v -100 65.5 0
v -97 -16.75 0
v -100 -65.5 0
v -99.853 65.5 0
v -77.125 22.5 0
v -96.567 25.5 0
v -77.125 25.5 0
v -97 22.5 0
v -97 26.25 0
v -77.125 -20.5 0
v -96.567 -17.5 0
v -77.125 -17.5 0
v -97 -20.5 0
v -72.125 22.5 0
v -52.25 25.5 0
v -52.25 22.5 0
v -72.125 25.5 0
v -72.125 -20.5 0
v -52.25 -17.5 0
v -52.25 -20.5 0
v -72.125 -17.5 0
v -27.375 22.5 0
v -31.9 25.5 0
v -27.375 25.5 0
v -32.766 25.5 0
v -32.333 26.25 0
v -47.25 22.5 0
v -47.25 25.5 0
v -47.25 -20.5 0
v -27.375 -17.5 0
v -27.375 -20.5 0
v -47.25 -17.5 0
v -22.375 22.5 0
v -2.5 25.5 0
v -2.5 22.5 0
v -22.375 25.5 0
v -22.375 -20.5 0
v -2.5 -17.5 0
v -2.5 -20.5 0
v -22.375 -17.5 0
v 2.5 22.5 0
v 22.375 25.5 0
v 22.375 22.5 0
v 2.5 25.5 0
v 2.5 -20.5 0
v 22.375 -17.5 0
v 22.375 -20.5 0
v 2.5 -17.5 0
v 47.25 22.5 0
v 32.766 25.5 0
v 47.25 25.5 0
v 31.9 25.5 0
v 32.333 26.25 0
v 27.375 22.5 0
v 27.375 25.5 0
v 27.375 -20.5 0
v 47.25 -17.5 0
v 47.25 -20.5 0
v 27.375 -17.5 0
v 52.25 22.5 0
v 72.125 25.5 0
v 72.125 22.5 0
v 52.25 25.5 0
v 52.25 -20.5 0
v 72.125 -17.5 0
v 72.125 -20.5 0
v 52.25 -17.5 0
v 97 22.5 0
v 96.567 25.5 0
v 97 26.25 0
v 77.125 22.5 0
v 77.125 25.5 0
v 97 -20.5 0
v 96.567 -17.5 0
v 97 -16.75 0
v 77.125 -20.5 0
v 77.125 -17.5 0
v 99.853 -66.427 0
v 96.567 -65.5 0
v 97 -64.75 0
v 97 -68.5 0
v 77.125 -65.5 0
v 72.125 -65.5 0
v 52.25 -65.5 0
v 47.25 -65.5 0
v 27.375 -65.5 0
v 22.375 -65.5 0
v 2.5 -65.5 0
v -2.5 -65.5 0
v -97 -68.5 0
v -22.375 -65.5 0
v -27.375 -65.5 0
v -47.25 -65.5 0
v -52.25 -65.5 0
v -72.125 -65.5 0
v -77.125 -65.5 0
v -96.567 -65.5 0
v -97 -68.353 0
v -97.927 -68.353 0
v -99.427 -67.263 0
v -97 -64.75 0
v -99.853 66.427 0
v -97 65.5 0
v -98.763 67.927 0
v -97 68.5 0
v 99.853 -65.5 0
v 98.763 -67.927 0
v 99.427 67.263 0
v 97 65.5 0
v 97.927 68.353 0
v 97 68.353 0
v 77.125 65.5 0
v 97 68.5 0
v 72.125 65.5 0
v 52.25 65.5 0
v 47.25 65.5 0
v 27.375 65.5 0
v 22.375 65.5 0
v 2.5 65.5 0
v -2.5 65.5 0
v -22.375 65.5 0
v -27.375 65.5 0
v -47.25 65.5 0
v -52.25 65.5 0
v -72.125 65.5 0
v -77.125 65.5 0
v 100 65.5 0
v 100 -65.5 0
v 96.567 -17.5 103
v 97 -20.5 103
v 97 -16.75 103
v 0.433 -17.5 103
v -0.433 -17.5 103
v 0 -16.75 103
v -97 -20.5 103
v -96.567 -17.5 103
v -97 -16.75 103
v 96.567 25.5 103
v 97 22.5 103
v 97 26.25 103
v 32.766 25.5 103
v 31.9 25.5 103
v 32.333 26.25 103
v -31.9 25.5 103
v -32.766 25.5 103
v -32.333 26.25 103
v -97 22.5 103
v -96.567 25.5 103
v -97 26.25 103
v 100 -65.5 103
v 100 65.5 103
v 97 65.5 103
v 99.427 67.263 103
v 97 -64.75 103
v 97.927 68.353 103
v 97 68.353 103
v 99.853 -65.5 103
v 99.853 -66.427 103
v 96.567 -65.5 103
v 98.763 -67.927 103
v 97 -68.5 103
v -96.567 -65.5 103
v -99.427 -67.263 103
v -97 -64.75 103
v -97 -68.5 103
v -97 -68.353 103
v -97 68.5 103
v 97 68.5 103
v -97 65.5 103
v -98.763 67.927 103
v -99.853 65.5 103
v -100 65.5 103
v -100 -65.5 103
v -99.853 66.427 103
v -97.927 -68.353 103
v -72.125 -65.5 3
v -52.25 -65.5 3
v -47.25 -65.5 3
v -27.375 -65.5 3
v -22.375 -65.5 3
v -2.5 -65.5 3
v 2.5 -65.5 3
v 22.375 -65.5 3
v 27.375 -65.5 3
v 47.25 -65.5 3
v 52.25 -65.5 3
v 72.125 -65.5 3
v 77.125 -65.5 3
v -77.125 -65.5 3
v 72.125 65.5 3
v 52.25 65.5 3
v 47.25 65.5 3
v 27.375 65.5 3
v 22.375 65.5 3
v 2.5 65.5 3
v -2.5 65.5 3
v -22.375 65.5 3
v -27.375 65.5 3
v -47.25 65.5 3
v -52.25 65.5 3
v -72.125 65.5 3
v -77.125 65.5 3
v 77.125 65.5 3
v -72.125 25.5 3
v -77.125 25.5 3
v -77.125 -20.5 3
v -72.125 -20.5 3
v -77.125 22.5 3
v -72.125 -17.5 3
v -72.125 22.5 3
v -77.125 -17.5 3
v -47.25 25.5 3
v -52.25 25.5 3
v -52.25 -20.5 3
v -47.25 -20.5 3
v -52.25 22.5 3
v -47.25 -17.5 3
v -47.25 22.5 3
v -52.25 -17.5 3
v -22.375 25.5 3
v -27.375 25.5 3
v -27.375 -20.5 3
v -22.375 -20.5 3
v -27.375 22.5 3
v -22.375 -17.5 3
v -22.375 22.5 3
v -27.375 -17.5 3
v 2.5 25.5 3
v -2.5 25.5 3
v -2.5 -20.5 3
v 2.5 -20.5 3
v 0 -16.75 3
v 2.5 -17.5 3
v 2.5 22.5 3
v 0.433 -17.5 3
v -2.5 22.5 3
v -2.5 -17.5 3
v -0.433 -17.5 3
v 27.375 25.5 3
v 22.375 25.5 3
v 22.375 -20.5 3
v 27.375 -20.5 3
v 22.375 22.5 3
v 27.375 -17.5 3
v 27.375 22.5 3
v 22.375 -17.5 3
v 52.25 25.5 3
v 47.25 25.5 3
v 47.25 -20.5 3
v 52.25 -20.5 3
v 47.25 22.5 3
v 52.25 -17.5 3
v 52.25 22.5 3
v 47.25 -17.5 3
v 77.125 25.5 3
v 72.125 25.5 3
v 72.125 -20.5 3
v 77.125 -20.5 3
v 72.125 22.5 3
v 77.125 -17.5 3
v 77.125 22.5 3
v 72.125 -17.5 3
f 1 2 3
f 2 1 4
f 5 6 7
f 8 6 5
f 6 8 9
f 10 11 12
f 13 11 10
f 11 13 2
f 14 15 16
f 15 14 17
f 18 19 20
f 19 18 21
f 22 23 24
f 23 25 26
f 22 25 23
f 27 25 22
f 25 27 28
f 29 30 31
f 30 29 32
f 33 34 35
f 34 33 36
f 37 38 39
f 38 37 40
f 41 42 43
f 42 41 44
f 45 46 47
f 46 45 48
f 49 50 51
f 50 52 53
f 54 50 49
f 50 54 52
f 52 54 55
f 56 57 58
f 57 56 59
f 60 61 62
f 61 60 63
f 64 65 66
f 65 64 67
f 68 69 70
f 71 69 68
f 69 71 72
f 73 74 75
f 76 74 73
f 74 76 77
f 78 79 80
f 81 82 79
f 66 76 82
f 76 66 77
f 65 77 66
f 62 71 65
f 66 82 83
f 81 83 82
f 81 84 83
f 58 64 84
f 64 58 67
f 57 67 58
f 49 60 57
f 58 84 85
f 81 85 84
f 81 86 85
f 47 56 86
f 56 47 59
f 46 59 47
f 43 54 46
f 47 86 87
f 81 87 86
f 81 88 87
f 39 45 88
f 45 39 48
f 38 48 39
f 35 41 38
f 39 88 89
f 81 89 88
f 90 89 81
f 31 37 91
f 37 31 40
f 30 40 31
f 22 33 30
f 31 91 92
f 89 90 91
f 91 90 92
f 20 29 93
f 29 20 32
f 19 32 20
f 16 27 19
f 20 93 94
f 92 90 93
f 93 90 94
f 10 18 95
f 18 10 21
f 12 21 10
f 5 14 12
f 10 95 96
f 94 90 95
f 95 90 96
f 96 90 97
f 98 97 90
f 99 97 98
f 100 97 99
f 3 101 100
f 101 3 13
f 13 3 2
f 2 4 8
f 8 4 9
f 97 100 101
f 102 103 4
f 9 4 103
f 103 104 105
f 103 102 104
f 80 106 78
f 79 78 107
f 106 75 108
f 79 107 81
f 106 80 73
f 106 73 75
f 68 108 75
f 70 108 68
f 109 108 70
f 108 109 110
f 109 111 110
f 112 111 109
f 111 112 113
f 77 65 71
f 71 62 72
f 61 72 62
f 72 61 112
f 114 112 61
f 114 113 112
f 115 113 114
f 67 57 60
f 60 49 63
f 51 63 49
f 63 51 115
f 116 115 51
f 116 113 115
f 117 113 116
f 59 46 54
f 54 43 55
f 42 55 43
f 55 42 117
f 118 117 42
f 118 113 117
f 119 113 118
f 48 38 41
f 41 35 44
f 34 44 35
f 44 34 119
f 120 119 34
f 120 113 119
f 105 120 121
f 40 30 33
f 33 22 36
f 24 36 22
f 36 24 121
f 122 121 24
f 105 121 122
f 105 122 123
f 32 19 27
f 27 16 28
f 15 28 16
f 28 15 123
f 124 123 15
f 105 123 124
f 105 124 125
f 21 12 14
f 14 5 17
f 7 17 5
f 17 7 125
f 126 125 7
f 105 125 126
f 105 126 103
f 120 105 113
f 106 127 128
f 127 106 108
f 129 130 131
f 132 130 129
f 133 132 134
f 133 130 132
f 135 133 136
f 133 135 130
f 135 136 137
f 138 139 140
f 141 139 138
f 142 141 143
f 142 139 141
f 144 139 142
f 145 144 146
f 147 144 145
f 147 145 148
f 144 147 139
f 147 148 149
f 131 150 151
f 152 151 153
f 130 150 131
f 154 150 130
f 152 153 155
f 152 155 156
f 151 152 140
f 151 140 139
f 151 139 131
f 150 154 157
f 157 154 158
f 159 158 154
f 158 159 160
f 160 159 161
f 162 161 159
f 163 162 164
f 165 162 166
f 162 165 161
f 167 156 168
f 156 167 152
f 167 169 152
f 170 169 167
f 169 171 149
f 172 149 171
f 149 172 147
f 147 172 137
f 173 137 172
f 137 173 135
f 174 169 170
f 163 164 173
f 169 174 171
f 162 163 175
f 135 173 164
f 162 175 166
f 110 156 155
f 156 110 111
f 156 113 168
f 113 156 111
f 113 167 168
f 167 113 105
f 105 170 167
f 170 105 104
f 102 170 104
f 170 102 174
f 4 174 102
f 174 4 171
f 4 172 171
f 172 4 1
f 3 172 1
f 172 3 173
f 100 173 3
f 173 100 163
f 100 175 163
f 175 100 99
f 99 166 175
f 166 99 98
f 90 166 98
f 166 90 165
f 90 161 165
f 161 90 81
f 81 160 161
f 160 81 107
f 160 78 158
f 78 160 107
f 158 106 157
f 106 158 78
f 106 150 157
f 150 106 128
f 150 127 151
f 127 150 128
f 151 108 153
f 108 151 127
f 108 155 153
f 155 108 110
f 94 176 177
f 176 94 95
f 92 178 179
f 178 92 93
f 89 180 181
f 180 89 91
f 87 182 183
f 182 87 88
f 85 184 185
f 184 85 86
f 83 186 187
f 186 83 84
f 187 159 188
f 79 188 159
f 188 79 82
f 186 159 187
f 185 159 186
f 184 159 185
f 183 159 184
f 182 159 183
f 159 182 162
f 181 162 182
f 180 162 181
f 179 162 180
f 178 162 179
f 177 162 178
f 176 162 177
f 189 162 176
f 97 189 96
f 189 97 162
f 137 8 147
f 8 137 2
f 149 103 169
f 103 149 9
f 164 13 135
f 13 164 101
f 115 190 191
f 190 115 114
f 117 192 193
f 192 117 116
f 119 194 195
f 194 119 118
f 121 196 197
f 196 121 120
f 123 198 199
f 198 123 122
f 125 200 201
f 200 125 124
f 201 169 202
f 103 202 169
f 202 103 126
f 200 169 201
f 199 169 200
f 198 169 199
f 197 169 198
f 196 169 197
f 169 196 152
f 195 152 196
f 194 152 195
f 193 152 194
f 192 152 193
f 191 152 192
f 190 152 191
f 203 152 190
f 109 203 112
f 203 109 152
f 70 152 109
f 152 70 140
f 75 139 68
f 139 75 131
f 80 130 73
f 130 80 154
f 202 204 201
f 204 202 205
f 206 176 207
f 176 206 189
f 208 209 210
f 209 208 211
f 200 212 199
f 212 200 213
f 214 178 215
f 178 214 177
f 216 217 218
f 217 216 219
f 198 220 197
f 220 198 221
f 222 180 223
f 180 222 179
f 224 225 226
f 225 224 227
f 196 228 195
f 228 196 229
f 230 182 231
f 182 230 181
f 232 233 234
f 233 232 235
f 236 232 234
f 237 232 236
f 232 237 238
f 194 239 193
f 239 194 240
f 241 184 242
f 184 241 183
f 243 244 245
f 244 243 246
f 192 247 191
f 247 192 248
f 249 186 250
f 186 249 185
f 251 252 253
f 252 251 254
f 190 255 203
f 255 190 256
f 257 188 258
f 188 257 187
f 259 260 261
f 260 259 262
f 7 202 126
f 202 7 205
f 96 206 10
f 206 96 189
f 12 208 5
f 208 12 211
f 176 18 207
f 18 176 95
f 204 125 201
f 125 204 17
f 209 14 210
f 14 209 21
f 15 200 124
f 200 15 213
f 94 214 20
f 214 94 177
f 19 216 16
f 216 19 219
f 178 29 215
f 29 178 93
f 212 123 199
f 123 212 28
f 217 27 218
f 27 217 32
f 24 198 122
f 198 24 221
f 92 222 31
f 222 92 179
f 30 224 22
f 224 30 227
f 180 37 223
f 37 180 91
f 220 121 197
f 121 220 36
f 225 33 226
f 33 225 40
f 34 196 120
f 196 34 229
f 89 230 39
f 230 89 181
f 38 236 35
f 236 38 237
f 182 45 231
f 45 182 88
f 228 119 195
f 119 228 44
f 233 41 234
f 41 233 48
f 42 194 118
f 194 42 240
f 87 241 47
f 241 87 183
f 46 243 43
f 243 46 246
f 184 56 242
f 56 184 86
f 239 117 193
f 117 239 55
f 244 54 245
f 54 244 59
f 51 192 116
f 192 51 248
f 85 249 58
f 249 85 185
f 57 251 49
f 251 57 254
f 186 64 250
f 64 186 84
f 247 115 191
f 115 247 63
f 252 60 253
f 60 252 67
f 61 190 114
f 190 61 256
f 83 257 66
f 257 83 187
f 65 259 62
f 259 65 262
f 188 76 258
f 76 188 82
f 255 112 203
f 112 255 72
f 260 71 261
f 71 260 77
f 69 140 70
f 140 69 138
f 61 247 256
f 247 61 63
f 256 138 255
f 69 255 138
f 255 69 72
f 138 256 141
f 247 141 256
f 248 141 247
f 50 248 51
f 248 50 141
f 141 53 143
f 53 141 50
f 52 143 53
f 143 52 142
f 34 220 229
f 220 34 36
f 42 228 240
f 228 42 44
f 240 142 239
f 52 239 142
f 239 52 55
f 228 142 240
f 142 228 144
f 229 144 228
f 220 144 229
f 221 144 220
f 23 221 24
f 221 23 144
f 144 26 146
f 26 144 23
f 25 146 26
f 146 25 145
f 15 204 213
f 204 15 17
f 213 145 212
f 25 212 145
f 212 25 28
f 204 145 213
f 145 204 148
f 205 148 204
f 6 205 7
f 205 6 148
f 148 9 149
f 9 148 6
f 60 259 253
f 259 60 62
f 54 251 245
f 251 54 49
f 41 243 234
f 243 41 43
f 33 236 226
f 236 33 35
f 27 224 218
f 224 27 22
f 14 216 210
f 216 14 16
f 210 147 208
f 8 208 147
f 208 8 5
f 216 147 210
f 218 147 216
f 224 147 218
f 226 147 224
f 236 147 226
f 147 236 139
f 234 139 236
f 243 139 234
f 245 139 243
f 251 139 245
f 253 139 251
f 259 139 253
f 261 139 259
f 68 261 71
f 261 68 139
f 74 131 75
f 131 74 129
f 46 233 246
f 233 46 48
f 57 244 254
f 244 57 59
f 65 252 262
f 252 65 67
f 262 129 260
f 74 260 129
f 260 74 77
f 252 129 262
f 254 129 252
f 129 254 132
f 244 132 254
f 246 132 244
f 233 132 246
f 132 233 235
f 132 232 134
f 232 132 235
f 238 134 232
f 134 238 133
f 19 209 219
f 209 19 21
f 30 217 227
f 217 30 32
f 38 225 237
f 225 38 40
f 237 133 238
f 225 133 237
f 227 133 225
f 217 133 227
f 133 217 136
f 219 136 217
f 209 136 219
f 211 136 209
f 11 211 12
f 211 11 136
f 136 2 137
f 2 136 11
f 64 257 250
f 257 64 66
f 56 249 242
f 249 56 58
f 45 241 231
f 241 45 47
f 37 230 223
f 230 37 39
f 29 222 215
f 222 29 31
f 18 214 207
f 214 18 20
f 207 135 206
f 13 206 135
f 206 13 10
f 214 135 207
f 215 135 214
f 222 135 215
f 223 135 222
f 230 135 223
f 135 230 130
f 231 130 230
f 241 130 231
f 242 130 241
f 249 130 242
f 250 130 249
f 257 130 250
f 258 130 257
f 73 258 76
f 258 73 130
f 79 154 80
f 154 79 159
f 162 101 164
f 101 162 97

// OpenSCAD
/* [Global] */
// thickness of the walls
thickness = 3; // [3:8]
// width, excluding the outside walls
innerWidth = 194; // [10:1000]
// depth, excluding the back wall
innerDepth = 100; // [10:500]
// heights of the rows, from bottom to top
innerHeights = [45, 40, 40];
// number of drawers per row, from bottom to top
drawersPerLevel = [1, 2, 3];

// which part to render?
part = "frame"; // [frame:Frame,drawer:Drawer]

/* [Frame] */
// width of the bars on the back wall
backBarWidth = 5; // [3:100]
// approximate gap between the back wall bars
approximateBackBarGap = 20; // [0:100]

/* [Drawer] */
// render a drawer for this row, counting from the bottom row. Zero based.
drawerRowFromBottom = 0; // [0:10]
// diameter for the finger hole
fingerHoleDiameter = 20; // [10:30]

/* [Hidden] */
innerHeight = ((len(innerHeights)-1) * thickness) + sum(innerHeights);
outerHeight = innerHeight + (2 * thickness);
outerWidth = innerWidth + (2 * thickness);

echo ("total height: ", outerHeight);
echo ("total width: ", outerWidth);

// back bars
gaps = ceil(innerWidth / (backBarWidth + approximateBackBarGap));
bars = gaps - 1;
total_bar_width = backBarWidth * (gaps - 1);
total_gap_width = innerWidth - total_bar_width;
gap_width = total_gap_width / gaps;
/*echo("gaps", gaps);
echo("total_bar_width", total_bar_width);
echo("total_gap_width", total_gap_width);
echo("gap_width", gap_width);*/

main();

function sum(v,n=999, i = 0) = i < len(v) && i < n ? v[i] + sum(v,n, i+1) : 0;

module main()
{
  if (part == "frame")
  {
    frame();
  }
  else if (part == "drawer")
  {
    drawerCountForRow = drawersPerLevel[drawerRowFromBottom];
    drawerWidth = (innerWidth / drawerCountForRow) - 1;

    drawerHeight = innerHeights[drawerRowFromBottom] - 1;
    drawer(drawerWidth, drawerHeight);
  }
}

module frame()
{
  translate([-outerWidth/2, -outerHeight/2, 0])
  {
    shell();
    /*solid_back();*/
    gap_back();
    shelves();
  }
}

module shell()
{
  linear_extrude(height=innerDepth + thickness)
  shell_shape();
}

module shell_shape()
{
  union()
  {
    translate([0, thickness, 0])
      square([thickness, innerHeight]);
    translate([thickness + innerWidth, thickness, 0])
      square([thickness, innerHeight]);
    translate([thickness, 0, 0])
      square([innerWidth, thickness]);
    translate([thickness, thickness + innerHeight, 0])
      square([innerWidth, thickness]);

    corner(0);
    translate([thickness + innerWidth, 0, 0])
      corner(90);
    translate([thickness + innerWidth, thickness + innerHeight, 0])
      corner(180);
    translate([0, thickness + innerHeight, 0])
      corner(270);
  }
}

module corner(rotation)
{
  translate([thickness/2, thickness/2, 0])
  rotate([0, 0, rotation])
  translate([-thickness/2, -thickness/2, 0])
    intersection()
    {
      translate([thickness, thickness, 0])
        circle(thickness);
      square(thickness, thickness);
    }
}

module solid_back()
{
  translate([thickness, thickness])
    linear_extrude(height=thickness)
    {
      square([innerWidth, innerHeight]);
    }
}

module gap_back()
{
  linear_extrude(thickness)
    gap_back_shape();
}

module gap_back_shape()
{
  offset = thickness + gap_width;
  step = backBarWidth + gap_width;

  for (i=[0:bars-1]) {
    translate([offset + (step * i), thickness])
      square([backBarWidth, innerHeight]);
  }
}

module shelves()
{
  linear_extrude(innerDepth + thickness)
    shelves_shape();
}

module shelves_shape()
{
  // for each row...
  for (i=[0:len(innerHeights)-1]) {
    // make a shelf for the drawers to sit on
    gapHeight = innerHeights[i];
    yOffset = sum(innerHeights, i) + (i * thickness);
    translate([thickness, yOffset, 0])
      square([innerWidth, thickness]);

    // and for each drawer in that row...
    drawersForLevel = drawersPerLevel[i];
    drawerWidth = innerWidth / drawersForLevel;
    for (j=[0:drawersForLevel]) {
      // make some runners
      translate([(thickness) + (drawerWidth * j), yOffset + (thickness*0.75), 0])
        rotate(90)
          circle(d=thickness, $fn=3);
    }
  }
}

module drawer(drawerWidth, drawerHeight)
{
  translate([-innerDepth/2, -drawerWidth/2, 0])
  {
    drawer_base(drawerWidth);

    // two sides
    drawer_side(drawerHeight);
    translate([0, drawerWidth - thickness, 0]) {
      drawer_side(drawerHeight);
    }

    // back
    drawer_back(drawerWidth, drawerHeight);

    // front
    drawer_front(drawerWidth, drawerHeight);
  }
}

module drawer_base(drawerWidth)
{
  difference()
  {
    linear_extrude(thickness)
      drawer_base_shape(drawerWidth);
    runner_cutout();
      translate([0, drawerWidth, 0])
      runner_cutout();
  }
}

module drawer_base_shape(drawerWidth)
{
  square([innerDepth, drawerWidth]);
}

module runner_cutout()
{
  rotate([0,90,0])
  linear_extrude(innerDepth)
    rotate(180)
      circle(d=thickness, $fn=3);
}

module drawer_side(drawerHeight)
{
  translate([0, 0, thickness])
    linear_extrude(drawerHeight - thickness)
      square([innerDepth, thickness]);
}

module drawer_back(drawerWidth, drawerHeight)
{
  translate([0, 0, thickness])
    linear_extrude(drawerHeight - thickness)
      square([thickness, drawerWidth]);
}

module drawer_front(drawerWidth, drawerHeight)
{
  translate([innerDepth, 0, thickness])
  rotate([0, -90, 0])
    difference()
      linear_extrude(thickness)
        difference()
        {
          square([drawerHeight - thickness, drawerWidth]);
          translate([(drawerHeight/2)-thickness, drawerWidth/2])
            circle(d=fingerHoleDiameter);
        }
}
